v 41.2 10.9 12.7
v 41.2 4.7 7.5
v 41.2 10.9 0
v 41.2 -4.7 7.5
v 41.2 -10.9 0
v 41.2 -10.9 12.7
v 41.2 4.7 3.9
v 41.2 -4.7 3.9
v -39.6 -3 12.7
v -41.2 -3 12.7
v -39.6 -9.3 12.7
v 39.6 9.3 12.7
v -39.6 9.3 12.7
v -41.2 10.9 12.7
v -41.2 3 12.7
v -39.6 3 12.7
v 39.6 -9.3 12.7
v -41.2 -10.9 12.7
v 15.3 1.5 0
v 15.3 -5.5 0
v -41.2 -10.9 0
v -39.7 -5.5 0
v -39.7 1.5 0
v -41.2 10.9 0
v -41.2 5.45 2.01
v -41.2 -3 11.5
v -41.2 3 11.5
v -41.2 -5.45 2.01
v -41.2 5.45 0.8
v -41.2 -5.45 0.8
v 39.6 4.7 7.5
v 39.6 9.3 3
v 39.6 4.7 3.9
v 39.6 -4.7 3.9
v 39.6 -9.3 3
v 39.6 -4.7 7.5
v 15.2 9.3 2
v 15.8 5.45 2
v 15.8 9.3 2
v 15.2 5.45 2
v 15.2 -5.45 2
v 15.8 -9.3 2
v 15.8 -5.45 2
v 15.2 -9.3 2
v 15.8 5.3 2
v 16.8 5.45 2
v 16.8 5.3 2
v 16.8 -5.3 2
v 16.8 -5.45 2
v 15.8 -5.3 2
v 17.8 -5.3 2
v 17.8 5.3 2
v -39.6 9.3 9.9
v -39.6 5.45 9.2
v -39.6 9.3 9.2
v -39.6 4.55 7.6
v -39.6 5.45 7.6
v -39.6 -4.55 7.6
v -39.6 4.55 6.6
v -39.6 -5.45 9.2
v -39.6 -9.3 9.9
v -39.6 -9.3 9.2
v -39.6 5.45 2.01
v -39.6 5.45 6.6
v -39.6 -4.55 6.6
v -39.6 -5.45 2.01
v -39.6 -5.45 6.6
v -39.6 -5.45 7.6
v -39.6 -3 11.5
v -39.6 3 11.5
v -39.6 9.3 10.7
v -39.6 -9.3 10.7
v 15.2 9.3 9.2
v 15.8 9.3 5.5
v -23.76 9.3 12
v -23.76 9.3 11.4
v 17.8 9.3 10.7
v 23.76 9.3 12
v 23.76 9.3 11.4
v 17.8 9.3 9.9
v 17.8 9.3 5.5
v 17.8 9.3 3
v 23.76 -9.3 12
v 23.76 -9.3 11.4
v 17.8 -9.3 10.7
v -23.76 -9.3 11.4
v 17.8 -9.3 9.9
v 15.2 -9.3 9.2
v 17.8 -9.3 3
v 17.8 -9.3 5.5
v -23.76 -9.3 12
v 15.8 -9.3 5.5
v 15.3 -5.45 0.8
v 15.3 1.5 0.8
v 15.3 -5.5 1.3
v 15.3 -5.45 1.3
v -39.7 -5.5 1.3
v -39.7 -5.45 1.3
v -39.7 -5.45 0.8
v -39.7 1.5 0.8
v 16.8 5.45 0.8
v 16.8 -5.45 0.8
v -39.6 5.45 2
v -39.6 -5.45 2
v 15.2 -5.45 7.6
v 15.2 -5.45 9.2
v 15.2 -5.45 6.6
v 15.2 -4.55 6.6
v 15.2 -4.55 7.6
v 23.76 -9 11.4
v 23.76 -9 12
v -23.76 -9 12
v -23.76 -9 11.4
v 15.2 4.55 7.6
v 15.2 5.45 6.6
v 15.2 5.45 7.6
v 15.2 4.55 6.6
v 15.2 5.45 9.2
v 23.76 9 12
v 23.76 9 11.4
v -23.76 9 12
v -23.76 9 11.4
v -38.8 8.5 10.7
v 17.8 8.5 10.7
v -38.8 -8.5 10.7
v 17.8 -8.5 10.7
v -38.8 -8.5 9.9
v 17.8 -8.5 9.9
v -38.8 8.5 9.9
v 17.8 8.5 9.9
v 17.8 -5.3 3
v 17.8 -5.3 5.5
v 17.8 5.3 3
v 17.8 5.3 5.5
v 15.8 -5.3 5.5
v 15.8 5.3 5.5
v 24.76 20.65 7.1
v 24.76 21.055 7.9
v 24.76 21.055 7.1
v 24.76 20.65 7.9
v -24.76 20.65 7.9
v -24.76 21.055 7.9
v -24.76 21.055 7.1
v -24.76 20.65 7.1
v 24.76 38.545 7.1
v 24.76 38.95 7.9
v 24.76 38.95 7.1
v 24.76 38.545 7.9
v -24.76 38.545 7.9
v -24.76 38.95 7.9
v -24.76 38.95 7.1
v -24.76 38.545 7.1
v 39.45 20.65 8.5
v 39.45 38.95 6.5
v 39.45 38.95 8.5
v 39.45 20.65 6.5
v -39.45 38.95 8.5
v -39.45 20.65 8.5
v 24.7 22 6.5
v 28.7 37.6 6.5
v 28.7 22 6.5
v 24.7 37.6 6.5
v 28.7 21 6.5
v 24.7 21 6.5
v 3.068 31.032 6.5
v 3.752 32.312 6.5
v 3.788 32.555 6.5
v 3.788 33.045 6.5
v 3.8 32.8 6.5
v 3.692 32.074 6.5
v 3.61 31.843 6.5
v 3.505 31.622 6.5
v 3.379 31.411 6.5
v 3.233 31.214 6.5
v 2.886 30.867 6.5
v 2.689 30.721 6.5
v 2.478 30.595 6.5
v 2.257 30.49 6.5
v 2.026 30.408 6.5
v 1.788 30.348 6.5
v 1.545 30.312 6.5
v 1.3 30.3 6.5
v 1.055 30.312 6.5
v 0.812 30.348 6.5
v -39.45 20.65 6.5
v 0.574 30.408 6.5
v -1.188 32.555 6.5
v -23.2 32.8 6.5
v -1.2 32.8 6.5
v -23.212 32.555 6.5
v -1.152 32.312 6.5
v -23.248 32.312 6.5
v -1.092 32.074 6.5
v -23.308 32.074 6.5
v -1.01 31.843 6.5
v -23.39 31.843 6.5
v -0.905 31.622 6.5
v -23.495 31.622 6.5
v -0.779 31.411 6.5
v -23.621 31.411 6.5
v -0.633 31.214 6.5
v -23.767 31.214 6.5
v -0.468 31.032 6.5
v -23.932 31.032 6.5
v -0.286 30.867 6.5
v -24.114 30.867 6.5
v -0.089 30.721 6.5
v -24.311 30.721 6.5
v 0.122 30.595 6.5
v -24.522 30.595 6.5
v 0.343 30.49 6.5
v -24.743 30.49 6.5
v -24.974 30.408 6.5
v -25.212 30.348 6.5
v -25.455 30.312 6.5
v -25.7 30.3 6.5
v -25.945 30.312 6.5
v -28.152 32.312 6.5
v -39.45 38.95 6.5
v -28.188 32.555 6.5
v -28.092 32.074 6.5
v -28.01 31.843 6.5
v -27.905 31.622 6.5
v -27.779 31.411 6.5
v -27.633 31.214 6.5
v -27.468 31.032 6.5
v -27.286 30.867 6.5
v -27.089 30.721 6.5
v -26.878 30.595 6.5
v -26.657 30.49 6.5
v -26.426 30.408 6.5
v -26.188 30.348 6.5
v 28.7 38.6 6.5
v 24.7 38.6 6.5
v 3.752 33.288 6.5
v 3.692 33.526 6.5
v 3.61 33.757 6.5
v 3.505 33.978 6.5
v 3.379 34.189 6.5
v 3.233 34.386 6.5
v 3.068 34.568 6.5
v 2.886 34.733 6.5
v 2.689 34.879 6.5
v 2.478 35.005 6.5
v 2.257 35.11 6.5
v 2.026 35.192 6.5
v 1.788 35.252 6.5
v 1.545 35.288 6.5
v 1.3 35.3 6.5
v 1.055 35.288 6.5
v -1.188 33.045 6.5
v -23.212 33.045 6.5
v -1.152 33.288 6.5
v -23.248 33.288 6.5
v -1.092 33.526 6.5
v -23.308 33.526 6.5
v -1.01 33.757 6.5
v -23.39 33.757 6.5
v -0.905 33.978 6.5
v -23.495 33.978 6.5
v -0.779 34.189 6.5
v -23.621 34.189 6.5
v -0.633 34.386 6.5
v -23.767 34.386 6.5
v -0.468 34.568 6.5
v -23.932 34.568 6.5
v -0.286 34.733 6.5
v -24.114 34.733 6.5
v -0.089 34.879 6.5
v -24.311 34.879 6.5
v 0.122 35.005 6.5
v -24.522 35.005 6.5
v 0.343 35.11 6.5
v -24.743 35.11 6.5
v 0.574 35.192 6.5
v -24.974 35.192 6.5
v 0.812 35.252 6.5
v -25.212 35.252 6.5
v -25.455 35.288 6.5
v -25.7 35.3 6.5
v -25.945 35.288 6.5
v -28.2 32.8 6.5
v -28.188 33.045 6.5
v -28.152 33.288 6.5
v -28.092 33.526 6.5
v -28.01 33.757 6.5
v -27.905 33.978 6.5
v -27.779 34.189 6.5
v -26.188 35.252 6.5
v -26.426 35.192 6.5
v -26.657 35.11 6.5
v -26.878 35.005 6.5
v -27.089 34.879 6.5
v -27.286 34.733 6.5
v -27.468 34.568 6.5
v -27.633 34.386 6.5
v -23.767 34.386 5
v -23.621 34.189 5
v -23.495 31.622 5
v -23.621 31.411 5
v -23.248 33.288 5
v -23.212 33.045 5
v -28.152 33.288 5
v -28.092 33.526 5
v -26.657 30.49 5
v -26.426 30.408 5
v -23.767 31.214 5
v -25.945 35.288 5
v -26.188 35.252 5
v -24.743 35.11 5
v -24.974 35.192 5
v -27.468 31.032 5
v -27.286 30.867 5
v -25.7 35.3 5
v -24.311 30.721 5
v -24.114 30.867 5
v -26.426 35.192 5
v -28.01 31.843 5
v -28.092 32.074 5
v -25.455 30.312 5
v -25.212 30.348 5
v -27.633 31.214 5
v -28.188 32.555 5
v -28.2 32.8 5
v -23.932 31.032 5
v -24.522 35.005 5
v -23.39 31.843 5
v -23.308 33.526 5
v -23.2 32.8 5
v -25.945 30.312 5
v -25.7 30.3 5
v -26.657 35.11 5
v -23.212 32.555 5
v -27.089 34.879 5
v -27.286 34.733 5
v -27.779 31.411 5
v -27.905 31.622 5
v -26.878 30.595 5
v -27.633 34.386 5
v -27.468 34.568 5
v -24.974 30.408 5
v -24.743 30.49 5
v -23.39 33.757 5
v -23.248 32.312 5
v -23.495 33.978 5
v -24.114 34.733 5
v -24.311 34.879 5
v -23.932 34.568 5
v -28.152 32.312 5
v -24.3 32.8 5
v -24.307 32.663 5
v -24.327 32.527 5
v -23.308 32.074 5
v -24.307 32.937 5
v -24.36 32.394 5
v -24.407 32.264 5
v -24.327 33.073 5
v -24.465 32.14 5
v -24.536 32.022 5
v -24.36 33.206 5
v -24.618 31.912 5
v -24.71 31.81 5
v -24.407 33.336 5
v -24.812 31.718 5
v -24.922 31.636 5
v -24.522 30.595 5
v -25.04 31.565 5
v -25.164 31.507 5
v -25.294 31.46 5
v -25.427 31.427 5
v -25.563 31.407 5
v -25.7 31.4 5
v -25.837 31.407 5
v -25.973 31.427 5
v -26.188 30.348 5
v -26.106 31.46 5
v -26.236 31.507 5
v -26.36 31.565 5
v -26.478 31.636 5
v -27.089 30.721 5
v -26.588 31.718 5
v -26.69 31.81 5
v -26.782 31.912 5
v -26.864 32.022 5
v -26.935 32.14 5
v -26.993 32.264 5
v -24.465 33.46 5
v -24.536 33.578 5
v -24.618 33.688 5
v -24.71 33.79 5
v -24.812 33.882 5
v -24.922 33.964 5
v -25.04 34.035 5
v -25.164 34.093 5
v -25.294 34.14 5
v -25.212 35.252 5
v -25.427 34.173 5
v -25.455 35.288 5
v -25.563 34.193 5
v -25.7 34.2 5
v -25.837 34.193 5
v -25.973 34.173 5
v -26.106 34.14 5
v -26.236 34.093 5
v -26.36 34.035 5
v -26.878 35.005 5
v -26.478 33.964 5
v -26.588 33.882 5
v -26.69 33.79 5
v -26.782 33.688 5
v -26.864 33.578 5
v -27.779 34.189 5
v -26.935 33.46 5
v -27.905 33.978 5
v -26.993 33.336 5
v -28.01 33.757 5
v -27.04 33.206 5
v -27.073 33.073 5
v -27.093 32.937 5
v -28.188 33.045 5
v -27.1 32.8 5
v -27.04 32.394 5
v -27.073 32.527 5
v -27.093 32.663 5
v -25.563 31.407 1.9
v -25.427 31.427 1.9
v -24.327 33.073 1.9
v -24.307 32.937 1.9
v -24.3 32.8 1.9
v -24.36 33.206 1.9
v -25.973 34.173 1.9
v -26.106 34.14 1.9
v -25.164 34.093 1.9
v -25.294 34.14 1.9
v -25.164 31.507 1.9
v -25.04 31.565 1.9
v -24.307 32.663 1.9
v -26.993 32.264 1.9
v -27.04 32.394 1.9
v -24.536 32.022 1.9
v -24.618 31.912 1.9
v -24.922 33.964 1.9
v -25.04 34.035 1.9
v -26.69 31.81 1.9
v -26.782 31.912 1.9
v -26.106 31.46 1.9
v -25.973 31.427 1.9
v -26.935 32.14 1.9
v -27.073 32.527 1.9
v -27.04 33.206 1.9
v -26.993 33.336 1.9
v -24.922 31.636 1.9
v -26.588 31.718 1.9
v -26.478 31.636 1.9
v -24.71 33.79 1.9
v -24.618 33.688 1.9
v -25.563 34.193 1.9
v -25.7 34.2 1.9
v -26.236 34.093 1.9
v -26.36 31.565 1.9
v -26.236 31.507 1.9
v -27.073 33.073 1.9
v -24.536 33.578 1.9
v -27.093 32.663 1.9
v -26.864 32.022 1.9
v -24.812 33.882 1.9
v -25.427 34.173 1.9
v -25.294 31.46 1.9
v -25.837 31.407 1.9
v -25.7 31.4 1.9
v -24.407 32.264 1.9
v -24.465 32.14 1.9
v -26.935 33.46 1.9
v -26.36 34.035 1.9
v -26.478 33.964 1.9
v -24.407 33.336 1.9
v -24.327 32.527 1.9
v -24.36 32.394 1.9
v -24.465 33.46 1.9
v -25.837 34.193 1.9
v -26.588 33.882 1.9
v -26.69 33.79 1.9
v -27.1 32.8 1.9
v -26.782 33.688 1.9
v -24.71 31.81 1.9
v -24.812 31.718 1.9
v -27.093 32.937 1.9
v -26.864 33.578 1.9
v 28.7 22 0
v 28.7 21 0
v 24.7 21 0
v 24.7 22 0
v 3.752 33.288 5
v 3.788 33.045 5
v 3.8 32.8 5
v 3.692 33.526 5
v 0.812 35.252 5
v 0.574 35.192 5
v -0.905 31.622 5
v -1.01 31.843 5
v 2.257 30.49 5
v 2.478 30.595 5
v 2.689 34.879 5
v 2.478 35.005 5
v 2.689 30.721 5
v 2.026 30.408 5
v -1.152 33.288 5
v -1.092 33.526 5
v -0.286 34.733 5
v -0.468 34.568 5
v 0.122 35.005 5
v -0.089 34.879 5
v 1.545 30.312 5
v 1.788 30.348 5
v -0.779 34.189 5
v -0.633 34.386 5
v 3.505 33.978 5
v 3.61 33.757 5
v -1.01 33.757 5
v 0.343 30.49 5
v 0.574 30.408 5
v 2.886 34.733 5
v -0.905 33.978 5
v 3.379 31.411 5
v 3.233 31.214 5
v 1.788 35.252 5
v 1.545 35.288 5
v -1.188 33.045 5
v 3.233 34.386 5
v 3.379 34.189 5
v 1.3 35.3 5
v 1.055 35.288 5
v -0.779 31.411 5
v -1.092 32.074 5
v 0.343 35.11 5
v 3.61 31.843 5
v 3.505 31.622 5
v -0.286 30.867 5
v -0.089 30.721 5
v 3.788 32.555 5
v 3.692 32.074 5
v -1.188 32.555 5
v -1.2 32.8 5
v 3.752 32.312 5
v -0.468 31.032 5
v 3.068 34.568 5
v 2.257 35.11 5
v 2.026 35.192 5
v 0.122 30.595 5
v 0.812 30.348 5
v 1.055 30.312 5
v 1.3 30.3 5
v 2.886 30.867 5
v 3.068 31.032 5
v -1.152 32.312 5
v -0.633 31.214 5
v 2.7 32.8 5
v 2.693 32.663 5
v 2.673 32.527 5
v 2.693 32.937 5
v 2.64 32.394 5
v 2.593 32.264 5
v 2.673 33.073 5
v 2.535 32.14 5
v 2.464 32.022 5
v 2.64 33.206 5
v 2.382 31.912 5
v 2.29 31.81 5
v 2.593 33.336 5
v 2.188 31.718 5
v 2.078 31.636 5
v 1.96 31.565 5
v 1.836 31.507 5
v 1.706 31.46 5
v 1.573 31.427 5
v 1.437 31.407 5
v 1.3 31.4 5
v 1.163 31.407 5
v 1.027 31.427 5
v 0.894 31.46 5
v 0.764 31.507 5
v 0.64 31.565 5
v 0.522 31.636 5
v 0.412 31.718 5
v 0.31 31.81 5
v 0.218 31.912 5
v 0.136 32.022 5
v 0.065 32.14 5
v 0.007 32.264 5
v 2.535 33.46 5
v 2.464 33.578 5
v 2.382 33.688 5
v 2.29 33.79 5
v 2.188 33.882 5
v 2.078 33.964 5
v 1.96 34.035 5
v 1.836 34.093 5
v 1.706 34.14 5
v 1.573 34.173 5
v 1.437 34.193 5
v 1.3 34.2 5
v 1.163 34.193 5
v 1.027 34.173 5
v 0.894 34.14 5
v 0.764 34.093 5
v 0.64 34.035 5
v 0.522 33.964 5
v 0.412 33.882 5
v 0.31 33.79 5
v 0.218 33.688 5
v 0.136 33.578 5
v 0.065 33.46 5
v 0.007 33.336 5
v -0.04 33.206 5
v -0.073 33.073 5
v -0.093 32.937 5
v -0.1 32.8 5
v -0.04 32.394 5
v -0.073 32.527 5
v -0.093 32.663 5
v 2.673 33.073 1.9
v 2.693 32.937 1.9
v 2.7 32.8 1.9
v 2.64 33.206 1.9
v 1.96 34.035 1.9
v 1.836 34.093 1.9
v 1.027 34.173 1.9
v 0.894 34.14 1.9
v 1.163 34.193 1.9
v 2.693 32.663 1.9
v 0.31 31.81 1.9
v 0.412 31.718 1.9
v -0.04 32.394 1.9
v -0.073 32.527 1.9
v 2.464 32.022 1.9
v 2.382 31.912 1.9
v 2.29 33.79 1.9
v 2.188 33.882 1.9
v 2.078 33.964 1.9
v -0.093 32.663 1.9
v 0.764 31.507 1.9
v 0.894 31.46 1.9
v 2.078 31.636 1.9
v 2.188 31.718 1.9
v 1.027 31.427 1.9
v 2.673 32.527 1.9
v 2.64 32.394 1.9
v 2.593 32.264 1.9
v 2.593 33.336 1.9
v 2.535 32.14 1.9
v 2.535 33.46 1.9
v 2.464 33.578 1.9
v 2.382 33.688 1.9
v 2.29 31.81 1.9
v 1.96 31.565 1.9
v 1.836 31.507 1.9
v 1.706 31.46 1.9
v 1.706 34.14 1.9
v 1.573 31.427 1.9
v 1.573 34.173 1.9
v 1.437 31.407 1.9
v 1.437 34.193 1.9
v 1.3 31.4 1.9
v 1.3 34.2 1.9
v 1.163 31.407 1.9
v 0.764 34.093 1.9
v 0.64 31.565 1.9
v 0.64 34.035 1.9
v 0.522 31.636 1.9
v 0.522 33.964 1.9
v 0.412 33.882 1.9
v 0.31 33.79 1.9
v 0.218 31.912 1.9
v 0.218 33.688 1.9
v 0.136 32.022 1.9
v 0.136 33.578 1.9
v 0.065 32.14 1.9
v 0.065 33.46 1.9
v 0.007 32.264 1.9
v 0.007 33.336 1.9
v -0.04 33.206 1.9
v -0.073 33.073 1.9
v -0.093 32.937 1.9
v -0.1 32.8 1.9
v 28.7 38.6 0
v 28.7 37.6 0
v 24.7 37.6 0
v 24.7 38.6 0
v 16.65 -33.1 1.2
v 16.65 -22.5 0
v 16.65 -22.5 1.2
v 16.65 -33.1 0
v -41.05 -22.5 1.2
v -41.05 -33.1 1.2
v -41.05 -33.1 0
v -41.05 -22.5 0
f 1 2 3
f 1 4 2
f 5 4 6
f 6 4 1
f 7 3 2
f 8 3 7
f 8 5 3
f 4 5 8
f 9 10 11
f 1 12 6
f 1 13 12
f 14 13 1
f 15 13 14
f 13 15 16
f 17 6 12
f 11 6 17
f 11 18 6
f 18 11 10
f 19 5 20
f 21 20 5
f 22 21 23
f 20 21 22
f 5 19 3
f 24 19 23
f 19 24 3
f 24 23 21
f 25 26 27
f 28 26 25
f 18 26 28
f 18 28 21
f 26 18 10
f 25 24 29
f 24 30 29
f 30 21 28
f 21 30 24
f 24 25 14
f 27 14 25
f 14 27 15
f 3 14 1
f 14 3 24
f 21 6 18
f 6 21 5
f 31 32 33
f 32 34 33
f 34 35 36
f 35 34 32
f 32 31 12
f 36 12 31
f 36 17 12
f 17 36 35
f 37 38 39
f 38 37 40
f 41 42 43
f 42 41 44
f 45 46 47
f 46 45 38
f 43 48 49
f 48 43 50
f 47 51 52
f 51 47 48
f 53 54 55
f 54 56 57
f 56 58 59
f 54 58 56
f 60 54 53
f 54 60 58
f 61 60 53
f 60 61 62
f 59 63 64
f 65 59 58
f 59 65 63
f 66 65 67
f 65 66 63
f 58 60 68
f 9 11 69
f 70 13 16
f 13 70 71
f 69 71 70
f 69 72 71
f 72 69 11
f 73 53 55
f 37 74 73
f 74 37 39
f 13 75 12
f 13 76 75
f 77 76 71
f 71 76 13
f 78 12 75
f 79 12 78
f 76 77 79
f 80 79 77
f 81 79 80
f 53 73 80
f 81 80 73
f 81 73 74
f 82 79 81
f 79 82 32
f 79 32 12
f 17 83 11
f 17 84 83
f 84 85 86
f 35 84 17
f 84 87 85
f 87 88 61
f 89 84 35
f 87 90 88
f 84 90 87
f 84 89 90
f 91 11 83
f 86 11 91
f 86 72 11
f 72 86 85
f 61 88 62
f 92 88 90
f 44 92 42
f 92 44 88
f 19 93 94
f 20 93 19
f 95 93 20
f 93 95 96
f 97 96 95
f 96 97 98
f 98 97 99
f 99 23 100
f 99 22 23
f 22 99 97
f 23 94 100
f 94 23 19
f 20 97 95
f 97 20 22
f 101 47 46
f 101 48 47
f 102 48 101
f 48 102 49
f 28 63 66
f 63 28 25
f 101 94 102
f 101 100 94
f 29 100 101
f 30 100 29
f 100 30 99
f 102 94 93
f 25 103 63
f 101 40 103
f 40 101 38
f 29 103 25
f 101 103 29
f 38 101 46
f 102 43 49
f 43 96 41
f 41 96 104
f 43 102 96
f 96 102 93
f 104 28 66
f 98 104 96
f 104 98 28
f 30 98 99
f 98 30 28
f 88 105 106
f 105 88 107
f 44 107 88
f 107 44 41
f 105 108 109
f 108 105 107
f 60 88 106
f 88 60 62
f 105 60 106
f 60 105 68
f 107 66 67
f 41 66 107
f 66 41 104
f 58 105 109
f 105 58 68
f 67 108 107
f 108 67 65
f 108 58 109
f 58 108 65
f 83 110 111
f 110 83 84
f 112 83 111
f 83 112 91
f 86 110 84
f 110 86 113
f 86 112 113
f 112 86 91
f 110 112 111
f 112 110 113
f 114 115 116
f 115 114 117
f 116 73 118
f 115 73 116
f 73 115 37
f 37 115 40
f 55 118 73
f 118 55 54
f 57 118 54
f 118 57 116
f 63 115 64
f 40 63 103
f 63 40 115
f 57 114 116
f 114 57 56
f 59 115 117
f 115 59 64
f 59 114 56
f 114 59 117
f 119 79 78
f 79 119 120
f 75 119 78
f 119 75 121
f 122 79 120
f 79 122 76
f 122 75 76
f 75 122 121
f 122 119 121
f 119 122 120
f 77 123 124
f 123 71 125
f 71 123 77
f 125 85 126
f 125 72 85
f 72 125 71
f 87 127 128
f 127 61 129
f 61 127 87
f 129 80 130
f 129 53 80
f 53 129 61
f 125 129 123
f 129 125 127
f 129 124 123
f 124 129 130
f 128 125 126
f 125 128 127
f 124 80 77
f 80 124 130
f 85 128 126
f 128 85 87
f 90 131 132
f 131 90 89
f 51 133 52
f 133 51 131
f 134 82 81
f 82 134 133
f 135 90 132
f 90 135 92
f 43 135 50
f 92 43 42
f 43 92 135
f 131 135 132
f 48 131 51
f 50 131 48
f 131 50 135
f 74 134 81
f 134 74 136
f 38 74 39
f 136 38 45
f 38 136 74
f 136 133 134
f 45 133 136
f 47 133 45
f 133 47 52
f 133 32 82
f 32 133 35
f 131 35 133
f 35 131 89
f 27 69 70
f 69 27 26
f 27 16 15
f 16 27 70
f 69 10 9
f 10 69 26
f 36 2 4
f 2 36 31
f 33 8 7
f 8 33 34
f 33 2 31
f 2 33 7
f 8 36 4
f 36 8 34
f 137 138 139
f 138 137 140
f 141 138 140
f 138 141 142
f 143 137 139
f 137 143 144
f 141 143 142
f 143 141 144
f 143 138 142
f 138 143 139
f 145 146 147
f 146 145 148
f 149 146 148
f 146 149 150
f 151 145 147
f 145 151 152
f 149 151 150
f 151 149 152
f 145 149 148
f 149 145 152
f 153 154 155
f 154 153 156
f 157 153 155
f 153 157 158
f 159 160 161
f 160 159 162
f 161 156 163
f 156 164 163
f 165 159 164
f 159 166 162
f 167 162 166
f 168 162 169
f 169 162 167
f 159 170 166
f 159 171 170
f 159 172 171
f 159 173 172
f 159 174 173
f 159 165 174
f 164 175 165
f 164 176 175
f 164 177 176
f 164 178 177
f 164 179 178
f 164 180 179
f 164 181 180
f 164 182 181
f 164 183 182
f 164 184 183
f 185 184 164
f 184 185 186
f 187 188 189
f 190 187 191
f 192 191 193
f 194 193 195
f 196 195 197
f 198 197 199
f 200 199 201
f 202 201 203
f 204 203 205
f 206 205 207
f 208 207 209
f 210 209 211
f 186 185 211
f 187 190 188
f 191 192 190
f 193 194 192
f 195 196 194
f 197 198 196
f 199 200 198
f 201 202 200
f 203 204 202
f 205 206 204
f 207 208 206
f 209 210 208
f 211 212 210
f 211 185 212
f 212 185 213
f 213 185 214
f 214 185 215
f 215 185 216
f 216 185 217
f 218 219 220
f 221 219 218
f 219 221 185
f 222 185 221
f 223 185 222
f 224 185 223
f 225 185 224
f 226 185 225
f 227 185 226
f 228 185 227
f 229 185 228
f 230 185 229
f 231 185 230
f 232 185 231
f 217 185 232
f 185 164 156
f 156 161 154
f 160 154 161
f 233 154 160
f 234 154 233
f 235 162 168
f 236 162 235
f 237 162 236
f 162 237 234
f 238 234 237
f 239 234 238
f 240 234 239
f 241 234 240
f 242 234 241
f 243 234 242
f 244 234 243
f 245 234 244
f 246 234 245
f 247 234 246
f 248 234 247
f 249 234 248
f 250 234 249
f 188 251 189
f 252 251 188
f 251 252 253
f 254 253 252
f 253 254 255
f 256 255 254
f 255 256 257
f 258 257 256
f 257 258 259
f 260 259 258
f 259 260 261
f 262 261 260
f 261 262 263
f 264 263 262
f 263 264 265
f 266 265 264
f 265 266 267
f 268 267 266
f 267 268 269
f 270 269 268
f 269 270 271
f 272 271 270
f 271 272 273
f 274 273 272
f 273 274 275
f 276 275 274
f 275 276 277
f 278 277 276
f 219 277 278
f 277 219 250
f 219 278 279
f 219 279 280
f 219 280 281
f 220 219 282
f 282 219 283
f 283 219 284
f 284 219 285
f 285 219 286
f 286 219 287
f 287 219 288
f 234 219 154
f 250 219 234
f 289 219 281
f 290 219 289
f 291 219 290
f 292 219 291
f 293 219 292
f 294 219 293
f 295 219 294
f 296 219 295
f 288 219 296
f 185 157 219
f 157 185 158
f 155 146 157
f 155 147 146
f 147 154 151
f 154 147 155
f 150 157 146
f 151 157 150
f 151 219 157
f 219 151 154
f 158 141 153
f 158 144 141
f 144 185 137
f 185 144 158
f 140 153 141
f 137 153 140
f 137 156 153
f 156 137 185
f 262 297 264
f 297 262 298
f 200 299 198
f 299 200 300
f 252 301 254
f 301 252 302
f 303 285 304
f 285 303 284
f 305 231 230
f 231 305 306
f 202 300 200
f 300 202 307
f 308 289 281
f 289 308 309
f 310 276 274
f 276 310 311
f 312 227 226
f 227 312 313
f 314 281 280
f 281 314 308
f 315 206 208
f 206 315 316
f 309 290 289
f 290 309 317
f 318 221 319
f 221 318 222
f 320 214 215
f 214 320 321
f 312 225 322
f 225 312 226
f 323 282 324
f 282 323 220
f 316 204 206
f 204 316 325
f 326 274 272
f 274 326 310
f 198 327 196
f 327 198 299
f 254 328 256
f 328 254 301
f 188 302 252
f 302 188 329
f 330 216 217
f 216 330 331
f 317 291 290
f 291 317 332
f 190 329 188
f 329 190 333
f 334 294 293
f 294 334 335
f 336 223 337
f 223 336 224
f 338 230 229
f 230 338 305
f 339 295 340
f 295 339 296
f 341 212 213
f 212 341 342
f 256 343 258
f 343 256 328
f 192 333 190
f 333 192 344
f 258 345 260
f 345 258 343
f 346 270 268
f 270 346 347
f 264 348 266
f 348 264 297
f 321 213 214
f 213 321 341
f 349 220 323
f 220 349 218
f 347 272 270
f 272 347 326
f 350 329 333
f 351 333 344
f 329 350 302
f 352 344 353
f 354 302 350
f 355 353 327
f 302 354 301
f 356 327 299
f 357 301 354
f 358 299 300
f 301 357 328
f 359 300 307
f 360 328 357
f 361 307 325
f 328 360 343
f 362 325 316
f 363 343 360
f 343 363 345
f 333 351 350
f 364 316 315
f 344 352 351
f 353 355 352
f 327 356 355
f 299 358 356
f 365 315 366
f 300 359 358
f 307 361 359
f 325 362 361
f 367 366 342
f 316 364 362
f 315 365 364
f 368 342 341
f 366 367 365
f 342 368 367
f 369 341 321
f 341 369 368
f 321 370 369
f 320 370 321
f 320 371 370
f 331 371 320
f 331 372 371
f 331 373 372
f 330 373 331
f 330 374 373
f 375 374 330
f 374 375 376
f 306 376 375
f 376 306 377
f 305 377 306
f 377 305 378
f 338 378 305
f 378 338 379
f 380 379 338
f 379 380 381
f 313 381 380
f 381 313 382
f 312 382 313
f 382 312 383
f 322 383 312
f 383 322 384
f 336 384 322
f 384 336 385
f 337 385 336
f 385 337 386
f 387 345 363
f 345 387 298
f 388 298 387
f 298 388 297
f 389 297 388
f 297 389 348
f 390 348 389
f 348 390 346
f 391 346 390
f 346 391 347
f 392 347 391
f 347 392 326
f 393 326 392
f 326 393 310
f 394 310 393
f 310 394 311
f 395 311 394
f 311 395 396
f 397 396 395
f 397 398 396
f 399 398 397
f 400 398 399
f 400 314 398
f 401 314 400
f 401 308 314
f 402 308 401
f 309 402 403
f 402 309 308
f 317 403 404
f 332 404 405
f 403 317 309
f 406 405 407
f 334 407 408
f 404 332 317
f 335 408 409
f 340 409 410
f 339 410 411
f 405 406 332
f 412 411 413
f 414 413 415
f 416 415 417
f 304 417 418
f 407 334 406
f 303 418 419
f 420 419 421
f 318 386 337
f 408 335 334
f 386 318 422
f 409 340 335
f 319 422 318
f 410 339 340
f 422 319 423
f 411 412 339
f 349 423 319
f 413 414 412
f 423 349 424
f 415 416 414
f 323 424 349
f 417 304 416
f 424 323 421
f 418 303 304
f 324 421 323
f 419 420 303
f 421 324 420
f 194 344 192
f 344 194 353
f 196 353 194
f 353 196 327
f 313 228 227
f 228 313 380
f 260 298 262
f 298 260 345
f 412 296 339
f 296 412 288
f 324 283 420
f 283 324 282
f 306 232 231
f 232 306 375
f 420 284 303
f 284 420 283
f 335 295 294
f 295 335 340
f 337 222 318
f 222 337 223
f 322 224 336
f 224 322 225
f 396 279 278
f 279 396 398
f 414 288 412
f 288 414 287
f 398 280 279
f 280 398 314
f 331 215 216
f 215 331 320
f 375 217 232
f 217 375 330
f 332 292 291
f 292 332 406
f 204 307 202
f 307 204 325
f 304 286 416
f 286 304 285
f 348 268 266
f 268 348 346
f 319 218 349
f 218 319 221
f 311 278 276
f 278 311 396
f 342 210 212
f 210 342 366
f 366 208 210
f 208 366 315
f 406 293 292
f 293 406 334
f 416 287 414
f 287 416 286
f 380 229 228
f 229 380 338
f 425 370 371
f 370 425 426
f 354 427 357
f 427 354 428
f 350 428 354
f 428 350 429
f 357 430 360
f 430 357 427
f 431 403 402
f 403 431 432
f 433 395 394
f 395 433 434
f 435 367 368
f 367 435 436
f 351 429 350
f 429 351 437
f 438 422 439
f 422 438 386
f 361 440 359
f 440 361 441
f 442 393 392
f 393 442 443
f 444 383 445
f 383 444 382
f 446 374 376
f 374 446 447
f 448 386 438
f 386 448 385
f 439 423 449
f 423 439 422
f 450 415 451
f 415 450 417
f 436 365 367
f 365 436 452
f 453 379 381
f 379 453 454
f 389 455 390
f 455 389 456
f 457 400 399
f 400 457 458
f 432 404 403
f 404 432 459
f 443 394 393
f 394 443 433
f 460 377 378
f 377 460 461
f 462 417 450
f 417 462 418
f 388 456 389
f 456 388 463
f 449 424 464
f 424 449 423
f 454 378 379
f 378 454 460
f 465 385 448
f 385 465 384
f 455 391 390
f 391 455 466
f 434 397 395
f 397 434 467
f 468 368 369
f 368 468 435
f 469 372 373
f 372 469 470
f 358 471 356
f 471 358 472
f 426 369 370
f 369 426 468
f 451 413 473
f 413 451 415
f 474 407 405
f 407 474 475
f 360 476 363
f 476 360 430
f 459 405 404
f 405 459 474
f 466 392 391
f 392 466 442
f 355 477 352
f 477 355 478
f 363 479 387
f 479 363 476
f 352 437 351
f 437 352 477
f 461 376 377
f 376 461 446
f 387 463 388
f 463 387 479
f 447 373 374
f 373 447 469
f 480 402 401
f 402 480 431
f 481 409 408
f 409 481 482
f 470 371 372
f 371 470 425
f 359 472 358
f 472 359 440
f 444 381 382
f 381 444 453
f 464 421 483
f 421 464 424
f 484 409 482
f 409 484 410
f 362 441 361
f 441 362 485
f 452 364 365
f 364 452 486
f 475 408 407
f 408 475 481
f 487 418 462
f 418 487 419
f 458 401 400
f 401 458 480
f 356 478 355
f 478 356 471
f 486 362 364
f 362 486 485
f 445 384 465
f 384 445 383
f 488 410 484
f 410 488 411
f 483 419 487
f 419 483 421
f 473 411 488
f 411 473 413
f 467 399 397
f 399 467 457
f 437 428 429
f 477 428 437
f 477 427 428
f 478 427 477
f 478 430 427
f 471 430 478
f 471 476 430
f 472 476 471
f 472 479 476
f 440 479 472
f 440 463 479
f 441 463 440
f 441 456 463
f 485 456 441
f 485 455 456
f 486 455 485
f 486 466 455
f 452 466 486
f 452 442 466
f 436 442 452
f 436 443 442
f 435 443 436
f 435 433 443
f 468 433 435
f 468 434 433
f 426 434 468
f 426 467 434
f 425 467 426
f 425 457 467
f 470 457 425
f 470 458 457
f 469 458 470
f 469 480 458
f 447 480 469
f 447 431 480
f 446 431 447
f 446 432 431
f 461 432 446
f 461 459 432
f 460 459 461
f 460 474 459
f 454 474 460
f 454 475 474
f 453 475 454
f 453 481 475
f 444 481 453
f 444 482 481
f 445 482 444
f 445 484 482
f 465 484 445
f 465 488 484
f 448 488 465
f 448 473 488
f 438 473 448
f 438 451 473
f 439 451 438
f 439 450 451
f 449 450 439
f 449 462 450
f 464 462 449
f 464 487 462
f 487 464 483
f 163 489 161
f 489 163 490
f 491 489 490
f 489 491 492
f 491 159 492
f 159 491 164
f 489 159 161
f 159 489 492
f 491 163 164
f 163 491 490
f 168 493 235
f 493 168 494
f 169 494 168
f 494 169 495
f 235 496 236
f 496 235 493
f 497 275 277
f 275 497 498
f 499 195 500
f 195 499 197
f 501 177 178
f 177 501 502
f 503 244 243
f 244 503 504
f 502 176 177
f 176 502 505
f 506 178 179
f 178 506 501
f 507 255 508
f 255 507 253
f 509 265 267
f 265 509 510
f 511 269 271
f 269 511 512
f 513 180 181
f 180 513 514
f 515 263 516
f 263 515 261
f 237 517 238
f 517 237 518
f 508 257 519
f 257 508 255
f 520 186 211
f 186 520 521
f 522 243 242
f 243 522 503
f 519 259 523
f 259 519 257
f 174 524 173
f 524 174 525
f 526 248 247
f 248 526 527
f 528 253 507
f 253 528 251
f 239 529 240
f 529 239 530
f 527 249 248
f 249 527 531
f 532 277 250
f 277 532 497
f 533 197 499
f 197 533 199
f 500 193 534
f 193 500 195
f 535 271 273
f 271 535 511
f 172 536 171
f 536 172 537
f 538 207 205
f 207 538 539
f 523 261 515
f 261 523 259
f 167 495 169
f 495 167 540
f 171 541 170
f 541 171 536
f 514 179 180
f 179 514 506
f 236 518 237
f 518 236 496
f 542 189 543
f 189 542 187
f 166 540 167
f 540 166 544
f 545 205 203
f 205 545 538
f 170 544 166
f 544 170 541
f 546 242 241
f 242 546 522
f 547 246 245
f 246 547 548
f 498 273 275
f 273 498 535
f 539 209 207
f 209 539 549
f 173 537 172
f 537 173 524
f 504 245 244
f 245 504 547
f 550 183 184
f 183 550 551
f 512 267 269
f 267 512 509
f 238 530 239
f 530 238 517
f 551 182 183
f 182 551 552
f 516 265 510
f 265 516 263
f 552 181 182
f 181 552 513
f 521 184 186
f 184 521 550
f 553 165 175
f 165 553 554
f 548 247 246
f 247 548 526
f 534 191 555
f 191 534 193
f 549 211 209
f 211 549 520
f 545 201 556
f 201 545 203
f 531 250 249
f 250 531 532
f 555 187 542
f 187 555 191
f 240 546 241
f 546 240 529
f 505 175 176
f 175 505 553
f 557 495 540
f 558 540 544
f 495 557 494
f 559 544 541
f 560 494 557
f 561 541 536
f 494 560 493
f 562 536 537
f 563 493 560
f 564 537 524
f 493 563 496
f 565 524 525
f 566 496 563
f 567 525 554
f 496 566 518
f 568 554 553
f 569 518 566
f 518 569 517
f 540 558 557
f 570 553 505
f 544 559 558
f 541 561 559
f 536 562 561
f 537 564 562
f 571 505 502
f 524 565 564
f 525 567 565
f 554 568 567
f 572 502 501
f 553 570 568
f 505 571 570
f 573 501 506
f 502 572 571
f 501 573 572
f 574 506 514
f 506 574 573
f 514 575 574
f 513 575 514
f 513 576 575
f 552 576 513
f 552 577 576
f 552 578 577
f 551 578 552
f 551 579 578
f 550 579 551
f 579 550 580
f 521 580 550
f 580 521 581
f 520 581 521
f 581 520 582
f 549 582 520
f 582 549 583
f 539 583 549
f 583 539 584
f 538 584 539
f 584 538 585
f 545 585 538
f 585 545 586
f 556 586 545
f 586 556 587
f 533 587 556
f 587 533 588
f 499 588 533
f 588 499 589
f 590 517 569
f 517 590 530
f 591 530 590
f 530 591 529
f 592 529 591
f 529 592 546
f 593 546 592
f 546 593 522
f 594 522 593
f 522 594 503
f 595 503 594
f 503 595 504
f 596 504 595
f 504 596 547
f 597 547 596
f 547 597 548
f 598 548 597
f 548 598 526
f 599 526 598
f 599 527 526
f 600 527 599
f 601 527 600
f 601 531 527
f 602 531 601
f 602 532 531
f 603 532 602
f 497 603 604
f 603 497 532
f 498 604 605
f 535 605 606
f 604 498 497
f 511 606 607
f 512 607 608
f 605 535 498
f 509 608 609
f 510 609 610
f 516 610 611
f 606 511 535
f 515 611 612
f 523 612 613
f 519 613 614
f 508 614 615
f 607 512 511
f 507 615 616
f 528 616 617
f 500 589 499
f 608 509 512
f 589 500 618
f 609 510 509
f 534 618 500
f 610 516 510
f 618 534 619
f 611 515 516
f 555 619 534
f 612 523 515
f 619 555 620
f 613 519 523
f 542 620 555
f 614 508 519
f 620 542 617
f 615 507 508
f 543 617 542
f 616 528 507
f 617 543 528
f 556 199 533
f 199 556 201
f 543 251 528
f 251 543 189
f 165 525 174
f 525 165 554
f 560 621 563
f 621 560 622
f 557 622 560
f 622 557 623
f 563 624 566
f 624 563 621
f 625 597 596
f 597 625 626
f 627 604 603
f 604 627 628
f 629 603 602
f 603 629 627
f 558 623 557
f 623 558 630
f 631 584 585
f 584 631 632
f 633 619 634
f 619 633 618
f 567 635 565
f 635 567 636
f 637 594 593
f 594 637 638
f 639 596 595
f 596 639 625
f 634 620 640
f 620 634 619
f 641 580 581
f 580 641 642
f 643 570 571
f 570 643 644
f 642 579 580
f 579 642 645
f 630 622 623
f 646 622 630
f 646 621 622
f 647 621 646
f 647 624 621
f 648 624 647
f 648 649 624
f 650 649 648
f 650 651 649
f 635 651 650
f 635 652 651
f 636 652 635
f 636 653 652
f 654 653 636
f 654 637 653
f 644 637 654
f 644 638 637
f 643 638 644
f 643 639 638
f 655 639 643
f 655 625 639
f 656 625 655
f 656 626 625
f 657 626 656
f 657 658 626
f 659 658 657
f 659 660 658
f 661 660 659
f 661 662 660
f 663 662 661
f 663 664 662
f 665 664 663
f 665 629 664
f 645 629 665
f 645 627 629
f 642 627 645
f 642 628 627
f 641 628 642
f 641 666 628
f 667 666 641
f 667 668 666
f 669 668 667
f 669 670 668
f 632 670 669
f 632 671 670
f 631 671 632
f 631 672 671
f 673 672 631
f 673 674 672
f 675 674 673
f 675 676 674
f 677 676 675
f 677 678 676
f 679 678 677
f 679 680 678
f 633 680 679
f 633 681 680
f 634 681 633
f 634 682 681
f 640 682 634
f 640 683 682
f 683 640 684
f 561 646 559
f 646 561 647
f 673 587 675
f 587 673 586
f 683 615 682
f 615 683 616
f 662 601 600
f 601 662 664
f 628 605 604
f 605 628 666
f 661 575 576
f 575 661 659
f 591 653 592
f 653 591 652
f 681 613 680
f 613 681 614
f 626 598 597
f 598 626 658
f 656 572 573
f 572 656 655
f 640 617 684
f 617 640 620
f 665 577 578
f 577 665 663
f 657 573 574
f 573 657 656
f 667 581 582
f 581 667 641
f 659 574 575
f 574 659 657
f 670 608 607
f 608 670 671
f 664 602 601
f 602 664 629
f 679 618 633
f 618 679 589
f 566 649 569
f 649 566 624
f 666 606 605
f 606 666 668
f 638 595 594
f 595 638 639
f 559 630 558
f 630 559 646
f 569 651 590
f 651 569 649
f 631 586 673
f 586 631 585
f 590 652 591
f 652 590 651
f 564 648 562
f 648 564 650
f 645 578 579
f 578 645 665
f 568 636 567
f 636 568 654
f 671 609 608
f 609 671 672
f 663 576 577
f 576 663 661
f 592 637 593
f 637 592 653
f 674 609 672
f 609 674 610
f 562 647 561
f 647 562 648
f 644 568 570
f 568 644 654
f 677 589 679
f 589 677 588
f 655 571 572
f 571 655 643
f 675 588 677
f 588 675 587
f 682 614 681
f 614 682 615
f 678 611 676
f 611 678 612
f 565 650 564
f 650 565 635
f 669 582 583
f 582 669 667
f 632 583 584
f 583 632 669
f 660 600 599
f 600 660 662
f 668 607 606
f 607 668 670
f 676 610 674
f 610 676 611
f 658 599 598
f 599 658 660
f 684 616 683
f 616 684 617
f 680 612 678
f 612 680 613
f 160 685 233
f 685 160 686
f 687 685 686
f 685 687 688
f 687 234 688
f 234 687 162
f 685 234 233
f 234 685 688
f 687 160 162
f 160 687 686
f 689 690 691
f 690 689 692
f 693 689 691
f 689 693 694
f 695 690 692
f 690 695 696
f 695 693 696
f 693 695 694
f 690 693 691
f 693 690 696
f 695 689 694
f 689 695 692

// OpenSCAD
// file: desk_accent_case.scad
// Desk Accent (#221) enclosure: OpenSCAD port of desk_accent_case.py (build123d).
// Both files describe the same geometry. If you change a dimension, change it in both, or
// regenerate the STLs from one and treat the other as stale.
//
// A slim inline bar stuck under the G9's bottom edge, in front of the stand neck, window DOWN.
//   body   : opaque PLA (black). Prints floor-down as modelled.
//   lid    : opaque PLA. A plate that SNAPS flush into the top of the body (a bead on the body's
//            long walls clicks into a groove round the lid edge). Exported flat face down. The
//            flat face takes the adhesive against the monitor. Pry notch in the LED-end wall.
//   window : CLEAR PLA, printed on the TEXTURED PEI plate. The frosted face goes DOWN.
//
// Export one part:  openscad -D 'PART="body"' -o desk_accent_body.stl desk_accent_case.scad
// PART: "all" (assembly preview), "body", "lid", "window".
PART = "all";

$fn = 64;

// ---- parts ----
STICK_L = 54.0; STICK_W = 10.1; STICK_H = 3.2;   // 8x WS2812B stick (measured 54 x 10.1)
STICK_PCB = 1.6;
// Stick mounting holes: dia ~3.1, 27 mm apart. HOLE_Y and LED_Y are offsets from the bar's
// centreline, ESTIMATED from a photo. Re-measure if the pins miss the holes.
HOLE_PITCH = 27.0; HOLE_Y = 3.0; LED_Y = -2.0;
PIN_D = 2.8; SHOULDER_D = 5.0;
XIAO_L = 21.0; XIAO_W = 17.8; XIAO_PCB = 1.2;    // Seeed XIAO ESP32S3
USB_W = 9.4; USB_H = 3.6;

// ---- case ----
CLR = 0.4; WALL = 1.6;
LIP_T = 0.8; WIN_T = 1.2; FLOOR = LIP_T + WIN_T;
APER_L = STICK_L + 1.0; APER_W = 7.0;            // light aperture over the LED row
WIN_L = APER_L + 3.0; WIN_W = STICK_W + 2 * CLR; // window pocket spans the stick channel
FIT = 0.15;
LED_GAP = 4.0;        // LED face to window top
LEDGE = 0.9;
WIRE_GAP = 3.0;
LID_T = 2.0; SEAT = 0.8;
BEAD = 0.3; BEAD_H = 0.6; GROOVE = 0.4;          // snap: bead on the walls, groove on the lid
XIAO_PAD = 1.0; STOP_H = 2.5;

IN_W = XIAO_W + 2 * CLR;
IN_L = STICK_L + WIRE_GAP + XIAO_L + 3 * CLR;
IN_H = LED_GAP + STICK_H + 1.5;
OUT_L = IN_L + 2 * WALL; OUT_W = IN_W + 2 * WALL;
LID_Z = FLOOR + IN_H;            // lid underside (body frame)
OUT_H = LID_Z + LID_T;           // body top = lid top (flush)
x0 = -IN_L / 2;
stick_cx = x0 + CLR + STICK_L / 2;
xiao_cx = x0 + CLR + STICK_L + WIRE_GAP + CLR + XIAO_L / 2;
xiao_far = xiao_cx - XIAO_L / 2;
side_w = IN_W / 2 - STICK_W / 2 - CLR;
ledge_top = FLOOR + LED_GAP + (STICK_H - STICK_PCB);
usb_z = FLOOR + XIAO_PAD + XIAO_PCB + USB_H / 2 - 0.3;
shoulder_len = LID_Z - (FLOOR + LED_GAP + STICK_H);
pin_len = shoulder_len + STICK_PCB + 1.5;
hold_len = LID_Z - (FLOOR + XIAO_PAD + XIAO_PCB);

// box centred in x/y at (cx, cy), bottom at z (= build123d Align CENTER, CENTER, MIN)
module bx(cx, cy, z, l, w, h) { translate([cx - l / 2, cy - w / 2, z]) cube([l, w, h]); }

module body() {
    difference() {
        union() {
            difference() {
                bx(0, 0, 0, OUT_L, OUT_W, OUT_H);
                bx(0, 0, FLOOR, IN_L, IN_W, OUT_H);                          // cavity
                bx(stick_cx, LED_Y, -0.5, APER_L, APER_W, LIP_T + 1);        // light aperture
                bx(stick_cx, 0, LIP_T, WIN_L, WIN_W, WIN_T + 0.01);          // window pocket
            }
            for (s = [-1, 1]) {
                // side guides, wall to stick edge
                bx(stick_cx, s * (IN_W / 2 - side_w / 2), FLOOR, STICK_L + 2 * CLR, side_w, LED_GAP + STICK_H);
                // ledges under the stick's long edges (LEDs hang below the PCB)
                bx(stick_cx, s * (STICK_W / 2 + CLR - LEDGE / 2), ledge_top - 1.0, STICK_L + 2 * CLR, LEDGE, 1.0);
                // snap beads on the long walls, middle 60 % of the length
                bx(0, s * (IN_W / 2 - BEAD / 2), LID_Z + LID_T / 2 - BEAD_H / 2, IN_L * 0.6, BEAD, BEAD_H);
            }
            // lid seat ring, open along the long walls over the XIAO bay (hold-down posts pass there)
            difference() {
                bx(0, 0, LID_Z - SEAT, IN_L, IN_W, SEAT);
                bx(0, 0, LID_Z - SEAT - 0.01, IN_L - 2 * SEAT, IN_W - 2 * SEAT, SEAT + 0.02);
                bx(xiao_cx, 0, LID_Z - SEAT - 0.01, XIAO_L + 2 * CLR, IN_W, SEAT + 0.02);
            }
            // XIAO cradle: pad + two corner stops at the far edge (centre open for the wires)
            bx(xiao_cx, 0, FLOOR, XIAO_L + 2 * CLR, IN_W, XIAO_PAD);
            for (s = [-1, 1])
                bx(xiao_far - CLR - 1.0, s * (IN_W / 2 - 2.0), FLOOR, 2.0, 4.0, XIAO_PAD + STOP_H);
        }
        bx(-OUT_L / 2 + WALL / 2, 0, OUT_H - 1.2, WALL + 1, 6.0, 2.0);           // pry notch
        translate([OUT_L / 2 - WALL / 2, 0, usb_z]) cube([WALL + 2, USB_W, USB_H], center = true); // USB-C
    }
}

module window() { bx(0, 0, 0, WIN_L - 2 * FIT, WIN_W - 2 * FIT, WIN_T); }

// lid frame: z = 0 is the lid's underside (= body LID_Z); posts and pins hang below it
module lid() {
    union() {
        difference() {
            bx(0, 0, 0, IN_L - 2 * FIT, IN_W - 2 * FIT, LID_T);
            for (s = [-1, 1])   // groove the beads click into
                bx(0, s * (IN_W / 2 - FIT - GROOVE / 2), LID_T / 2 - (BEAD_H + 0.2) / 2,
                   IN_L * 0.6 + 2.0, GROOVE + 0.01, BEAD_H + 0.2);
        }
        for (s = [-1, 1]) {
            px = stick_cx + s * HOLE_PITCH / 2;
            // shoulder clamps the stick onto its ledges; the pin goes through its mounting hole
            translate([px, HOLE_Y, -shoulder_len]) cylinder(d = SHOULDER_D, h = shoulder_len + 0.01);
            translate([px, HOLE_Y, -pin_len]) cylinder(d = PIN_D, h = pin_len - shoulder_len + 0.01);
            // XIAO hold-downs on the board's long-edge pad strips
            bx(xiao_cx - 2.0, s * (XIAO_W / 2 - 0.6), -hold_len, 4.0, 1.0, hold_len + 0.01);
        }
    }
}

if (PART == "body") body();
else if (PART == "lid") translate([0, 0, LID_T]) rotate([180, 0, 0]) lid();   // flat face on the bed
else if (PART == "window") window();
else if (PART == "none") {}   // render_sidebyside.scad draws its own dressed view
else {
    body();
    translate([0, OUT_W + 8, hold_len]) lid();
    translate([stick_cx, -(OUT_W + 6), 0]) window();
}
// main file
// README picture (make images): the earlier side-by-side case, its parts laid out, in print colours.
include <desk_accent_case.scad>
PART = "none";
color("#55575e") body();
color("#55575e") translate([0, OUT_W + 8, hold_len]) lid();
color("#d8ecf2", 0.8) translate([stick_cx, -(OUT_W + 6), 0]) window();
